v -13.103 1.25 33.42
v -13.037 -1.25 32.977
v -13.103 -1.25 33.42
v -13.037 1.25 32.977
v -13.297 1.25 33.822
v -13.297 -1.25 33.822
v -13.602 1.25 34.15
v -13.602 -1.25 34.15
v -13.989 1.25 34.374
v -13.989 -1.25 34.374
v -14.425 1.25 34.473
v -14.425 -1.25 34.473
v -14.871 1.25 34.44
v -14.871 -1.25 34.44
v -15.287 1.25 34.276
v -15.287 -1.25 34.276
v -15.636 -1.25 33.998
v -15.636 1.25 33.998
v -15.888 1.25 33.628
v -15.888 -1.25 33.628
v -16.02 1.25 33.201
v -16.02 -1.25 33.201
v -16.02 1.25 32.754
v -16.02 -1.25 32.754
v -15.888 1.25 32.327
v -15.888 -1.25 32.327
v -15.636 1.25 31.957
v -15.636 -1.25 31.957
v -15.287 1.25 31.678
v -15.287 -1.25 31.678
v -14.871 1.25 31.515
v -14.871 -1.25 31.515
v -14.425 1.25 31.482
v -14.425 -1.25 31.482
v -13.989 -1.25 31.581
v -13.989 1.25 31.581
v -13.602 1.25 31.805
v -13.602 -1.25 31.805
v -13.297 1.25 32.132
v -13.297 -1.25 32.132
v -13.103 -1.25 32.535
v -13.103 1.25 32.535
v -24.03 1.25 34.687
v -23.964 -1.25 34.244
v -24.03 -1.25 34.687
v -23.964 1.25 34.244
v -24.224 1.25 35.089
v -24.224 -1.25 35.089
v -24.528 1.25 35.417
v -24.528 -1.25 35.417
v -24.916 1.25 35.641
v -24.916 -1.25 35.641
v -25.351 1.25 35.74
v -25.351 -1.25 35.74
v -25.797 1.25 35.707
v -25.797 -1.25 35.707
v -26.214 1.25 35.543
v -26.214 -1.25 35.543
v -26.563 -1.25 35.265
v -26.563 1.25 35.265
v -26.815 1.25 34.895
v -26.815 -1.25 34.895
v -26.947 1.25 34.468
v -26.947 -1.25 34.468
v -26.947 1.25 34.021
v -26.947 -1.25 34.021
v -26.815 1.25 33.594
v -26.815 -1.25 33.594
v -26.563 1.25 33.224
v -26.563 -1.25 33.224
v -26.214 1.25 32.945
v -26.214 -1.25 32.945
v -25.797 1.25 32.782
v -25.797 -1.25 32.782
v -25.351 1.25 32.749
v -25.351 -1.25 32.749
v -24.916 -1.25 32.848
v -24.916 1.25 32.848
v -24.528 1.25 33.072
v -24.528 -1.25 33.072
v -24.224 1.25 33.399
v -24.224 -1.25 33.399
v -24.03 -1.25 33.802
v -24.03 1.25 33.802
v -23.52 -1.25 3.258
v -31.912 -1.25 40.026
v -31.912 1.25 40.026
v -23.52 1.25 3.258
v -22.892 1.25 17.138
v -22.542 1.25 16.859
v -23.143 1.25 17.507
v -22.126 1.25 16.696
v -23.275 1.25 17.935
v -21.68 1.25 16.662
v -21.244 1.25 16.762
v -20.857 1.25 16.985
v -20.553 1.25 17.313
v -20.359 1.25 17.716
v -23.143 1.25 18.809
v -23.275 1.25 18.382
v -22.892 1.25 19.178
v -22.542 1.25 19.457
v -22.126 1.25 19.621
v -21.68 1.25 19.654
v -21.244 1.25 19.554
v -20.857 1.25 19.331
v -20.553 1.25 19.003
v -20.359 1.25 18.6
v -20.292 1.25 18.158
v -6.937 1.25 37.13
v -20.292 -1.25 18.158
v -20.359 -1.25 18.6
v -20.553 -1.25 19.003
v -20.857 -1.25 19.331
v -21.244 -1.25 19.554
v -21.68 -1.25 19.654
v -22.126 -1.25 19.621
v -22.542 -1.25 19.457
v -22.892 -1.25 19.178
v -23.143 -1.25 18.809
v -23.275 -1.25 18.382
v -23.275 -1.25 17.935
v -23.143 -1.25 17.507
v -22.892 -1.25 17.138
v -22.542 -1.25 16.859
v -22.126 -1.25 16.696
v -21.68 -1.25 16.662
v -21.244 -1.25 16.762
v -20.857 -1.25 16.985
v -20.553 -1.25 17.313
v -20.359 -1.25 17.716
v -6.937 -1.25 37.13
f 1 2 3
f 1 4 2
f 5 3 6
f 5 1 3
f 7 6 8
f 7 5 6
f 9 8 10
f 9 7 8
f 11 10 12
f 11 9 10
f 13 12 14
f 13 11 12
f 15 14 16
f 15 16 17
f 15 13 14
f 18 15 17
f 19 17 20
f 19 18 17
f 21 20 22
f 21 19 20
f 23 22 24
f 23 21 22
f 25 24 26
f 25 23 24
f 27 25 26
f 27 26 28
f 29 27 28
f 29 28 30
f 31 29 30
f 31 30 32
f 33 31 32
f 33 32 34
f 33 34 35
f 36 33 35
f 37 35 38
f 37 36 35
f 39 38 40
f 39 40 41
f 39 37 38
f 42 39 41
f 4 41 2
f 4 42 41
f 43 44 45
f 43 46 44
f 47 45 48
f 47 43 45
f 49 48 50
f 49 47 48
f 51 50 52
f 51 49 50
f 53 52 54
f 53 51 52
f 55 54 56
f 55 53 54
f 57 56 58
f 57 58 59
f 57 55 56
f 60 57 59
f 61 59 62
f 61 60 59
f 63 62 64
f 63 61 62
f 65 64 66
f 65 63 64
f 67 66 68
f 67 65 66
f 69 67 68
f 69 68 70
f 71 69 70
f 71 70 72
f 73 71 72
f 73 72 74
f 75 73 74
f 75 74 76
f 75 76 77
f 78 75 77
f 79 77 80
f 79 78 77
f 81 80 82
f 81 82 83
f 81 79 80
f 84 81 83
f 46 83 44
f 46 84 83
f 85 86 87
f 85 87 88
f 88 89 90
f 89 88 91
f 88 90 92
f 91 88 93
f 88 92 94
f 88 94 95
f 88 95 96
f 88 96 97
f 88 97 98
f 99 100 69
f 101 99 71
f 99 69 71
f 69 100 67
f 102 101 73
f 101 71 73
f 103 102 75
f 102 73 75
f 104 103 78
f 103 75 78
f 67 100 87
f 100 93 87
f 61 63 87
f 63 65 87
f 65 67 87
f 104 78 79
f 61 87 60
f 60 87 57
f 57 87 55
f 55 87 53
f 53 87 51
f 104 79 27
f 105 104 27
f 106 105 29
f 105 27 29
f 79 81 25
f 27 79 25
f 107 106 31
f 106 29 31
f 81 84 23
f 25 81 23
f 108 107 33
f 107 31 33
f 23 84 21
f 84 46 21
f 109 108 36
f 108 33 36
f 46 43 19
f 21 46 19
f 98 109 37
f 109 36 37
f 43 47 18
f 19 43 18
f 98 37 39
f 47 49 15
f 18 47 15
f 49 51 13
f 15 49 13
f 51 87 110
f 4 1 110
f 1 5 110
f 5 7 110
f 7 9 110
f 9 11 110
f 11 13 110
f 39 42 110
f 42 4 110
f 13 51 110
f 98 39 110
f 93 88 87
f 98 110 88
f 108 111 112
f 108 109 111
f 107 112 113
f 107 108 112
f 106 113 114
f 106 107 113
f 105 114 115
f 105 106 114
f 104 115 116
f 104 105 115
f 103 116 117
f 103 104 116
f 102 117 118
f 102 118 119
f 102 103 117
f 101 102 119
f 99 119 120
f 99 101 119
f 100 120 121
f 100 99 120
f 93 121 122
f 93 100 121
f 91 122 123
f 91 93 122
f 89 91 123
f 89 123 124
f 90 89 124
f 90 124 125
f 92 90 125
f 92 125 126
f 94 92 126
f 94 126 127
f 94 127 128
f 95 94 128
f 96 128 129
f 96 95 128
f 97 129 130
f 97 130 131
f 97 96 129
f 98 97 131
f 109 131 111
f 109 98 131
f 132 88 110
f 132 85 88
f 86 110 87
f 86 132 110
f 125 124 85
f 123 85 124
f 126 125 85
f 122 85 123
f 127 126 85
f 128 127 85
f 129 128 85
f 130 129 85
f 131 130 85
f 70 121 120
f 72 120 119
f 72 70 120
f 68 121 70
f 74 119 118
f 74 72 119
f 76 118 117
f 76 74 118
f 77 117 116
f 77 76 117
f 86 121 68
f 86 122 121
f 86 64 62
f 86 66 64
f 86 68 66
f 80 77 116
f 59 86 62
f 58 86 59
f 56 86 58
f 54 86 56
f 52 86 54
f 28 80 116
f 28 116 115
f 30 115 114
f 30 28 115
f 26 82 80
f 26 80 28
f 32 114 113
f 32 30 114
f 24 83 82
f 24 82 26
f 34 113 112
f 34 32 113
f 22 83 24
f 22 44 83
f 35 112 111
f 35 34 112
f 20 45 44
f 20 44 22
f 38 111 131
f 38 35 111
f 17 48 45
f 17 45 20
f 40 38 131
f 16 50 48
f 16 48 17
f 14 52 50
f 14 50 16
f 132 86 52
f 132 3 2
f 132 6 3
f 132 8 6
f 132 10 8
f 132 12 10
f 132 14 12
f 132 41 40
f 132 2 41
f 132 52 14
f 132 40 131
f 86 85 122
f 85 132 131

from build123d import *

# Parameters (mm, degrees)
F0_R     = 1.5
F1_DEPTH = 1.25


with BuildPart() as f1:
    # F0 (on Front) → F1 (new body, symmetric)
    with BuildSketch(Plane.XZ):
        Polygon((-6.936875, 37.129661), (-31.911666, 40.025616), (-23.51977, 3.25795), align=None)
        with Locations((-21.79202, 18.158109)):
            Circle(F0_R, mode=Mode.SUBTRACT)
        with Locations((-25.463581, 34.244427)):
            Circle(F0_R, mode=Mode.SUBTRACT)
        with Locations((-14.536794, 32.97741)):
            Circle(F0_R, mode=Mode.SUBTRACT)
    extrude(amount=F1_DEPTH, both=True)


solid = f1.part
